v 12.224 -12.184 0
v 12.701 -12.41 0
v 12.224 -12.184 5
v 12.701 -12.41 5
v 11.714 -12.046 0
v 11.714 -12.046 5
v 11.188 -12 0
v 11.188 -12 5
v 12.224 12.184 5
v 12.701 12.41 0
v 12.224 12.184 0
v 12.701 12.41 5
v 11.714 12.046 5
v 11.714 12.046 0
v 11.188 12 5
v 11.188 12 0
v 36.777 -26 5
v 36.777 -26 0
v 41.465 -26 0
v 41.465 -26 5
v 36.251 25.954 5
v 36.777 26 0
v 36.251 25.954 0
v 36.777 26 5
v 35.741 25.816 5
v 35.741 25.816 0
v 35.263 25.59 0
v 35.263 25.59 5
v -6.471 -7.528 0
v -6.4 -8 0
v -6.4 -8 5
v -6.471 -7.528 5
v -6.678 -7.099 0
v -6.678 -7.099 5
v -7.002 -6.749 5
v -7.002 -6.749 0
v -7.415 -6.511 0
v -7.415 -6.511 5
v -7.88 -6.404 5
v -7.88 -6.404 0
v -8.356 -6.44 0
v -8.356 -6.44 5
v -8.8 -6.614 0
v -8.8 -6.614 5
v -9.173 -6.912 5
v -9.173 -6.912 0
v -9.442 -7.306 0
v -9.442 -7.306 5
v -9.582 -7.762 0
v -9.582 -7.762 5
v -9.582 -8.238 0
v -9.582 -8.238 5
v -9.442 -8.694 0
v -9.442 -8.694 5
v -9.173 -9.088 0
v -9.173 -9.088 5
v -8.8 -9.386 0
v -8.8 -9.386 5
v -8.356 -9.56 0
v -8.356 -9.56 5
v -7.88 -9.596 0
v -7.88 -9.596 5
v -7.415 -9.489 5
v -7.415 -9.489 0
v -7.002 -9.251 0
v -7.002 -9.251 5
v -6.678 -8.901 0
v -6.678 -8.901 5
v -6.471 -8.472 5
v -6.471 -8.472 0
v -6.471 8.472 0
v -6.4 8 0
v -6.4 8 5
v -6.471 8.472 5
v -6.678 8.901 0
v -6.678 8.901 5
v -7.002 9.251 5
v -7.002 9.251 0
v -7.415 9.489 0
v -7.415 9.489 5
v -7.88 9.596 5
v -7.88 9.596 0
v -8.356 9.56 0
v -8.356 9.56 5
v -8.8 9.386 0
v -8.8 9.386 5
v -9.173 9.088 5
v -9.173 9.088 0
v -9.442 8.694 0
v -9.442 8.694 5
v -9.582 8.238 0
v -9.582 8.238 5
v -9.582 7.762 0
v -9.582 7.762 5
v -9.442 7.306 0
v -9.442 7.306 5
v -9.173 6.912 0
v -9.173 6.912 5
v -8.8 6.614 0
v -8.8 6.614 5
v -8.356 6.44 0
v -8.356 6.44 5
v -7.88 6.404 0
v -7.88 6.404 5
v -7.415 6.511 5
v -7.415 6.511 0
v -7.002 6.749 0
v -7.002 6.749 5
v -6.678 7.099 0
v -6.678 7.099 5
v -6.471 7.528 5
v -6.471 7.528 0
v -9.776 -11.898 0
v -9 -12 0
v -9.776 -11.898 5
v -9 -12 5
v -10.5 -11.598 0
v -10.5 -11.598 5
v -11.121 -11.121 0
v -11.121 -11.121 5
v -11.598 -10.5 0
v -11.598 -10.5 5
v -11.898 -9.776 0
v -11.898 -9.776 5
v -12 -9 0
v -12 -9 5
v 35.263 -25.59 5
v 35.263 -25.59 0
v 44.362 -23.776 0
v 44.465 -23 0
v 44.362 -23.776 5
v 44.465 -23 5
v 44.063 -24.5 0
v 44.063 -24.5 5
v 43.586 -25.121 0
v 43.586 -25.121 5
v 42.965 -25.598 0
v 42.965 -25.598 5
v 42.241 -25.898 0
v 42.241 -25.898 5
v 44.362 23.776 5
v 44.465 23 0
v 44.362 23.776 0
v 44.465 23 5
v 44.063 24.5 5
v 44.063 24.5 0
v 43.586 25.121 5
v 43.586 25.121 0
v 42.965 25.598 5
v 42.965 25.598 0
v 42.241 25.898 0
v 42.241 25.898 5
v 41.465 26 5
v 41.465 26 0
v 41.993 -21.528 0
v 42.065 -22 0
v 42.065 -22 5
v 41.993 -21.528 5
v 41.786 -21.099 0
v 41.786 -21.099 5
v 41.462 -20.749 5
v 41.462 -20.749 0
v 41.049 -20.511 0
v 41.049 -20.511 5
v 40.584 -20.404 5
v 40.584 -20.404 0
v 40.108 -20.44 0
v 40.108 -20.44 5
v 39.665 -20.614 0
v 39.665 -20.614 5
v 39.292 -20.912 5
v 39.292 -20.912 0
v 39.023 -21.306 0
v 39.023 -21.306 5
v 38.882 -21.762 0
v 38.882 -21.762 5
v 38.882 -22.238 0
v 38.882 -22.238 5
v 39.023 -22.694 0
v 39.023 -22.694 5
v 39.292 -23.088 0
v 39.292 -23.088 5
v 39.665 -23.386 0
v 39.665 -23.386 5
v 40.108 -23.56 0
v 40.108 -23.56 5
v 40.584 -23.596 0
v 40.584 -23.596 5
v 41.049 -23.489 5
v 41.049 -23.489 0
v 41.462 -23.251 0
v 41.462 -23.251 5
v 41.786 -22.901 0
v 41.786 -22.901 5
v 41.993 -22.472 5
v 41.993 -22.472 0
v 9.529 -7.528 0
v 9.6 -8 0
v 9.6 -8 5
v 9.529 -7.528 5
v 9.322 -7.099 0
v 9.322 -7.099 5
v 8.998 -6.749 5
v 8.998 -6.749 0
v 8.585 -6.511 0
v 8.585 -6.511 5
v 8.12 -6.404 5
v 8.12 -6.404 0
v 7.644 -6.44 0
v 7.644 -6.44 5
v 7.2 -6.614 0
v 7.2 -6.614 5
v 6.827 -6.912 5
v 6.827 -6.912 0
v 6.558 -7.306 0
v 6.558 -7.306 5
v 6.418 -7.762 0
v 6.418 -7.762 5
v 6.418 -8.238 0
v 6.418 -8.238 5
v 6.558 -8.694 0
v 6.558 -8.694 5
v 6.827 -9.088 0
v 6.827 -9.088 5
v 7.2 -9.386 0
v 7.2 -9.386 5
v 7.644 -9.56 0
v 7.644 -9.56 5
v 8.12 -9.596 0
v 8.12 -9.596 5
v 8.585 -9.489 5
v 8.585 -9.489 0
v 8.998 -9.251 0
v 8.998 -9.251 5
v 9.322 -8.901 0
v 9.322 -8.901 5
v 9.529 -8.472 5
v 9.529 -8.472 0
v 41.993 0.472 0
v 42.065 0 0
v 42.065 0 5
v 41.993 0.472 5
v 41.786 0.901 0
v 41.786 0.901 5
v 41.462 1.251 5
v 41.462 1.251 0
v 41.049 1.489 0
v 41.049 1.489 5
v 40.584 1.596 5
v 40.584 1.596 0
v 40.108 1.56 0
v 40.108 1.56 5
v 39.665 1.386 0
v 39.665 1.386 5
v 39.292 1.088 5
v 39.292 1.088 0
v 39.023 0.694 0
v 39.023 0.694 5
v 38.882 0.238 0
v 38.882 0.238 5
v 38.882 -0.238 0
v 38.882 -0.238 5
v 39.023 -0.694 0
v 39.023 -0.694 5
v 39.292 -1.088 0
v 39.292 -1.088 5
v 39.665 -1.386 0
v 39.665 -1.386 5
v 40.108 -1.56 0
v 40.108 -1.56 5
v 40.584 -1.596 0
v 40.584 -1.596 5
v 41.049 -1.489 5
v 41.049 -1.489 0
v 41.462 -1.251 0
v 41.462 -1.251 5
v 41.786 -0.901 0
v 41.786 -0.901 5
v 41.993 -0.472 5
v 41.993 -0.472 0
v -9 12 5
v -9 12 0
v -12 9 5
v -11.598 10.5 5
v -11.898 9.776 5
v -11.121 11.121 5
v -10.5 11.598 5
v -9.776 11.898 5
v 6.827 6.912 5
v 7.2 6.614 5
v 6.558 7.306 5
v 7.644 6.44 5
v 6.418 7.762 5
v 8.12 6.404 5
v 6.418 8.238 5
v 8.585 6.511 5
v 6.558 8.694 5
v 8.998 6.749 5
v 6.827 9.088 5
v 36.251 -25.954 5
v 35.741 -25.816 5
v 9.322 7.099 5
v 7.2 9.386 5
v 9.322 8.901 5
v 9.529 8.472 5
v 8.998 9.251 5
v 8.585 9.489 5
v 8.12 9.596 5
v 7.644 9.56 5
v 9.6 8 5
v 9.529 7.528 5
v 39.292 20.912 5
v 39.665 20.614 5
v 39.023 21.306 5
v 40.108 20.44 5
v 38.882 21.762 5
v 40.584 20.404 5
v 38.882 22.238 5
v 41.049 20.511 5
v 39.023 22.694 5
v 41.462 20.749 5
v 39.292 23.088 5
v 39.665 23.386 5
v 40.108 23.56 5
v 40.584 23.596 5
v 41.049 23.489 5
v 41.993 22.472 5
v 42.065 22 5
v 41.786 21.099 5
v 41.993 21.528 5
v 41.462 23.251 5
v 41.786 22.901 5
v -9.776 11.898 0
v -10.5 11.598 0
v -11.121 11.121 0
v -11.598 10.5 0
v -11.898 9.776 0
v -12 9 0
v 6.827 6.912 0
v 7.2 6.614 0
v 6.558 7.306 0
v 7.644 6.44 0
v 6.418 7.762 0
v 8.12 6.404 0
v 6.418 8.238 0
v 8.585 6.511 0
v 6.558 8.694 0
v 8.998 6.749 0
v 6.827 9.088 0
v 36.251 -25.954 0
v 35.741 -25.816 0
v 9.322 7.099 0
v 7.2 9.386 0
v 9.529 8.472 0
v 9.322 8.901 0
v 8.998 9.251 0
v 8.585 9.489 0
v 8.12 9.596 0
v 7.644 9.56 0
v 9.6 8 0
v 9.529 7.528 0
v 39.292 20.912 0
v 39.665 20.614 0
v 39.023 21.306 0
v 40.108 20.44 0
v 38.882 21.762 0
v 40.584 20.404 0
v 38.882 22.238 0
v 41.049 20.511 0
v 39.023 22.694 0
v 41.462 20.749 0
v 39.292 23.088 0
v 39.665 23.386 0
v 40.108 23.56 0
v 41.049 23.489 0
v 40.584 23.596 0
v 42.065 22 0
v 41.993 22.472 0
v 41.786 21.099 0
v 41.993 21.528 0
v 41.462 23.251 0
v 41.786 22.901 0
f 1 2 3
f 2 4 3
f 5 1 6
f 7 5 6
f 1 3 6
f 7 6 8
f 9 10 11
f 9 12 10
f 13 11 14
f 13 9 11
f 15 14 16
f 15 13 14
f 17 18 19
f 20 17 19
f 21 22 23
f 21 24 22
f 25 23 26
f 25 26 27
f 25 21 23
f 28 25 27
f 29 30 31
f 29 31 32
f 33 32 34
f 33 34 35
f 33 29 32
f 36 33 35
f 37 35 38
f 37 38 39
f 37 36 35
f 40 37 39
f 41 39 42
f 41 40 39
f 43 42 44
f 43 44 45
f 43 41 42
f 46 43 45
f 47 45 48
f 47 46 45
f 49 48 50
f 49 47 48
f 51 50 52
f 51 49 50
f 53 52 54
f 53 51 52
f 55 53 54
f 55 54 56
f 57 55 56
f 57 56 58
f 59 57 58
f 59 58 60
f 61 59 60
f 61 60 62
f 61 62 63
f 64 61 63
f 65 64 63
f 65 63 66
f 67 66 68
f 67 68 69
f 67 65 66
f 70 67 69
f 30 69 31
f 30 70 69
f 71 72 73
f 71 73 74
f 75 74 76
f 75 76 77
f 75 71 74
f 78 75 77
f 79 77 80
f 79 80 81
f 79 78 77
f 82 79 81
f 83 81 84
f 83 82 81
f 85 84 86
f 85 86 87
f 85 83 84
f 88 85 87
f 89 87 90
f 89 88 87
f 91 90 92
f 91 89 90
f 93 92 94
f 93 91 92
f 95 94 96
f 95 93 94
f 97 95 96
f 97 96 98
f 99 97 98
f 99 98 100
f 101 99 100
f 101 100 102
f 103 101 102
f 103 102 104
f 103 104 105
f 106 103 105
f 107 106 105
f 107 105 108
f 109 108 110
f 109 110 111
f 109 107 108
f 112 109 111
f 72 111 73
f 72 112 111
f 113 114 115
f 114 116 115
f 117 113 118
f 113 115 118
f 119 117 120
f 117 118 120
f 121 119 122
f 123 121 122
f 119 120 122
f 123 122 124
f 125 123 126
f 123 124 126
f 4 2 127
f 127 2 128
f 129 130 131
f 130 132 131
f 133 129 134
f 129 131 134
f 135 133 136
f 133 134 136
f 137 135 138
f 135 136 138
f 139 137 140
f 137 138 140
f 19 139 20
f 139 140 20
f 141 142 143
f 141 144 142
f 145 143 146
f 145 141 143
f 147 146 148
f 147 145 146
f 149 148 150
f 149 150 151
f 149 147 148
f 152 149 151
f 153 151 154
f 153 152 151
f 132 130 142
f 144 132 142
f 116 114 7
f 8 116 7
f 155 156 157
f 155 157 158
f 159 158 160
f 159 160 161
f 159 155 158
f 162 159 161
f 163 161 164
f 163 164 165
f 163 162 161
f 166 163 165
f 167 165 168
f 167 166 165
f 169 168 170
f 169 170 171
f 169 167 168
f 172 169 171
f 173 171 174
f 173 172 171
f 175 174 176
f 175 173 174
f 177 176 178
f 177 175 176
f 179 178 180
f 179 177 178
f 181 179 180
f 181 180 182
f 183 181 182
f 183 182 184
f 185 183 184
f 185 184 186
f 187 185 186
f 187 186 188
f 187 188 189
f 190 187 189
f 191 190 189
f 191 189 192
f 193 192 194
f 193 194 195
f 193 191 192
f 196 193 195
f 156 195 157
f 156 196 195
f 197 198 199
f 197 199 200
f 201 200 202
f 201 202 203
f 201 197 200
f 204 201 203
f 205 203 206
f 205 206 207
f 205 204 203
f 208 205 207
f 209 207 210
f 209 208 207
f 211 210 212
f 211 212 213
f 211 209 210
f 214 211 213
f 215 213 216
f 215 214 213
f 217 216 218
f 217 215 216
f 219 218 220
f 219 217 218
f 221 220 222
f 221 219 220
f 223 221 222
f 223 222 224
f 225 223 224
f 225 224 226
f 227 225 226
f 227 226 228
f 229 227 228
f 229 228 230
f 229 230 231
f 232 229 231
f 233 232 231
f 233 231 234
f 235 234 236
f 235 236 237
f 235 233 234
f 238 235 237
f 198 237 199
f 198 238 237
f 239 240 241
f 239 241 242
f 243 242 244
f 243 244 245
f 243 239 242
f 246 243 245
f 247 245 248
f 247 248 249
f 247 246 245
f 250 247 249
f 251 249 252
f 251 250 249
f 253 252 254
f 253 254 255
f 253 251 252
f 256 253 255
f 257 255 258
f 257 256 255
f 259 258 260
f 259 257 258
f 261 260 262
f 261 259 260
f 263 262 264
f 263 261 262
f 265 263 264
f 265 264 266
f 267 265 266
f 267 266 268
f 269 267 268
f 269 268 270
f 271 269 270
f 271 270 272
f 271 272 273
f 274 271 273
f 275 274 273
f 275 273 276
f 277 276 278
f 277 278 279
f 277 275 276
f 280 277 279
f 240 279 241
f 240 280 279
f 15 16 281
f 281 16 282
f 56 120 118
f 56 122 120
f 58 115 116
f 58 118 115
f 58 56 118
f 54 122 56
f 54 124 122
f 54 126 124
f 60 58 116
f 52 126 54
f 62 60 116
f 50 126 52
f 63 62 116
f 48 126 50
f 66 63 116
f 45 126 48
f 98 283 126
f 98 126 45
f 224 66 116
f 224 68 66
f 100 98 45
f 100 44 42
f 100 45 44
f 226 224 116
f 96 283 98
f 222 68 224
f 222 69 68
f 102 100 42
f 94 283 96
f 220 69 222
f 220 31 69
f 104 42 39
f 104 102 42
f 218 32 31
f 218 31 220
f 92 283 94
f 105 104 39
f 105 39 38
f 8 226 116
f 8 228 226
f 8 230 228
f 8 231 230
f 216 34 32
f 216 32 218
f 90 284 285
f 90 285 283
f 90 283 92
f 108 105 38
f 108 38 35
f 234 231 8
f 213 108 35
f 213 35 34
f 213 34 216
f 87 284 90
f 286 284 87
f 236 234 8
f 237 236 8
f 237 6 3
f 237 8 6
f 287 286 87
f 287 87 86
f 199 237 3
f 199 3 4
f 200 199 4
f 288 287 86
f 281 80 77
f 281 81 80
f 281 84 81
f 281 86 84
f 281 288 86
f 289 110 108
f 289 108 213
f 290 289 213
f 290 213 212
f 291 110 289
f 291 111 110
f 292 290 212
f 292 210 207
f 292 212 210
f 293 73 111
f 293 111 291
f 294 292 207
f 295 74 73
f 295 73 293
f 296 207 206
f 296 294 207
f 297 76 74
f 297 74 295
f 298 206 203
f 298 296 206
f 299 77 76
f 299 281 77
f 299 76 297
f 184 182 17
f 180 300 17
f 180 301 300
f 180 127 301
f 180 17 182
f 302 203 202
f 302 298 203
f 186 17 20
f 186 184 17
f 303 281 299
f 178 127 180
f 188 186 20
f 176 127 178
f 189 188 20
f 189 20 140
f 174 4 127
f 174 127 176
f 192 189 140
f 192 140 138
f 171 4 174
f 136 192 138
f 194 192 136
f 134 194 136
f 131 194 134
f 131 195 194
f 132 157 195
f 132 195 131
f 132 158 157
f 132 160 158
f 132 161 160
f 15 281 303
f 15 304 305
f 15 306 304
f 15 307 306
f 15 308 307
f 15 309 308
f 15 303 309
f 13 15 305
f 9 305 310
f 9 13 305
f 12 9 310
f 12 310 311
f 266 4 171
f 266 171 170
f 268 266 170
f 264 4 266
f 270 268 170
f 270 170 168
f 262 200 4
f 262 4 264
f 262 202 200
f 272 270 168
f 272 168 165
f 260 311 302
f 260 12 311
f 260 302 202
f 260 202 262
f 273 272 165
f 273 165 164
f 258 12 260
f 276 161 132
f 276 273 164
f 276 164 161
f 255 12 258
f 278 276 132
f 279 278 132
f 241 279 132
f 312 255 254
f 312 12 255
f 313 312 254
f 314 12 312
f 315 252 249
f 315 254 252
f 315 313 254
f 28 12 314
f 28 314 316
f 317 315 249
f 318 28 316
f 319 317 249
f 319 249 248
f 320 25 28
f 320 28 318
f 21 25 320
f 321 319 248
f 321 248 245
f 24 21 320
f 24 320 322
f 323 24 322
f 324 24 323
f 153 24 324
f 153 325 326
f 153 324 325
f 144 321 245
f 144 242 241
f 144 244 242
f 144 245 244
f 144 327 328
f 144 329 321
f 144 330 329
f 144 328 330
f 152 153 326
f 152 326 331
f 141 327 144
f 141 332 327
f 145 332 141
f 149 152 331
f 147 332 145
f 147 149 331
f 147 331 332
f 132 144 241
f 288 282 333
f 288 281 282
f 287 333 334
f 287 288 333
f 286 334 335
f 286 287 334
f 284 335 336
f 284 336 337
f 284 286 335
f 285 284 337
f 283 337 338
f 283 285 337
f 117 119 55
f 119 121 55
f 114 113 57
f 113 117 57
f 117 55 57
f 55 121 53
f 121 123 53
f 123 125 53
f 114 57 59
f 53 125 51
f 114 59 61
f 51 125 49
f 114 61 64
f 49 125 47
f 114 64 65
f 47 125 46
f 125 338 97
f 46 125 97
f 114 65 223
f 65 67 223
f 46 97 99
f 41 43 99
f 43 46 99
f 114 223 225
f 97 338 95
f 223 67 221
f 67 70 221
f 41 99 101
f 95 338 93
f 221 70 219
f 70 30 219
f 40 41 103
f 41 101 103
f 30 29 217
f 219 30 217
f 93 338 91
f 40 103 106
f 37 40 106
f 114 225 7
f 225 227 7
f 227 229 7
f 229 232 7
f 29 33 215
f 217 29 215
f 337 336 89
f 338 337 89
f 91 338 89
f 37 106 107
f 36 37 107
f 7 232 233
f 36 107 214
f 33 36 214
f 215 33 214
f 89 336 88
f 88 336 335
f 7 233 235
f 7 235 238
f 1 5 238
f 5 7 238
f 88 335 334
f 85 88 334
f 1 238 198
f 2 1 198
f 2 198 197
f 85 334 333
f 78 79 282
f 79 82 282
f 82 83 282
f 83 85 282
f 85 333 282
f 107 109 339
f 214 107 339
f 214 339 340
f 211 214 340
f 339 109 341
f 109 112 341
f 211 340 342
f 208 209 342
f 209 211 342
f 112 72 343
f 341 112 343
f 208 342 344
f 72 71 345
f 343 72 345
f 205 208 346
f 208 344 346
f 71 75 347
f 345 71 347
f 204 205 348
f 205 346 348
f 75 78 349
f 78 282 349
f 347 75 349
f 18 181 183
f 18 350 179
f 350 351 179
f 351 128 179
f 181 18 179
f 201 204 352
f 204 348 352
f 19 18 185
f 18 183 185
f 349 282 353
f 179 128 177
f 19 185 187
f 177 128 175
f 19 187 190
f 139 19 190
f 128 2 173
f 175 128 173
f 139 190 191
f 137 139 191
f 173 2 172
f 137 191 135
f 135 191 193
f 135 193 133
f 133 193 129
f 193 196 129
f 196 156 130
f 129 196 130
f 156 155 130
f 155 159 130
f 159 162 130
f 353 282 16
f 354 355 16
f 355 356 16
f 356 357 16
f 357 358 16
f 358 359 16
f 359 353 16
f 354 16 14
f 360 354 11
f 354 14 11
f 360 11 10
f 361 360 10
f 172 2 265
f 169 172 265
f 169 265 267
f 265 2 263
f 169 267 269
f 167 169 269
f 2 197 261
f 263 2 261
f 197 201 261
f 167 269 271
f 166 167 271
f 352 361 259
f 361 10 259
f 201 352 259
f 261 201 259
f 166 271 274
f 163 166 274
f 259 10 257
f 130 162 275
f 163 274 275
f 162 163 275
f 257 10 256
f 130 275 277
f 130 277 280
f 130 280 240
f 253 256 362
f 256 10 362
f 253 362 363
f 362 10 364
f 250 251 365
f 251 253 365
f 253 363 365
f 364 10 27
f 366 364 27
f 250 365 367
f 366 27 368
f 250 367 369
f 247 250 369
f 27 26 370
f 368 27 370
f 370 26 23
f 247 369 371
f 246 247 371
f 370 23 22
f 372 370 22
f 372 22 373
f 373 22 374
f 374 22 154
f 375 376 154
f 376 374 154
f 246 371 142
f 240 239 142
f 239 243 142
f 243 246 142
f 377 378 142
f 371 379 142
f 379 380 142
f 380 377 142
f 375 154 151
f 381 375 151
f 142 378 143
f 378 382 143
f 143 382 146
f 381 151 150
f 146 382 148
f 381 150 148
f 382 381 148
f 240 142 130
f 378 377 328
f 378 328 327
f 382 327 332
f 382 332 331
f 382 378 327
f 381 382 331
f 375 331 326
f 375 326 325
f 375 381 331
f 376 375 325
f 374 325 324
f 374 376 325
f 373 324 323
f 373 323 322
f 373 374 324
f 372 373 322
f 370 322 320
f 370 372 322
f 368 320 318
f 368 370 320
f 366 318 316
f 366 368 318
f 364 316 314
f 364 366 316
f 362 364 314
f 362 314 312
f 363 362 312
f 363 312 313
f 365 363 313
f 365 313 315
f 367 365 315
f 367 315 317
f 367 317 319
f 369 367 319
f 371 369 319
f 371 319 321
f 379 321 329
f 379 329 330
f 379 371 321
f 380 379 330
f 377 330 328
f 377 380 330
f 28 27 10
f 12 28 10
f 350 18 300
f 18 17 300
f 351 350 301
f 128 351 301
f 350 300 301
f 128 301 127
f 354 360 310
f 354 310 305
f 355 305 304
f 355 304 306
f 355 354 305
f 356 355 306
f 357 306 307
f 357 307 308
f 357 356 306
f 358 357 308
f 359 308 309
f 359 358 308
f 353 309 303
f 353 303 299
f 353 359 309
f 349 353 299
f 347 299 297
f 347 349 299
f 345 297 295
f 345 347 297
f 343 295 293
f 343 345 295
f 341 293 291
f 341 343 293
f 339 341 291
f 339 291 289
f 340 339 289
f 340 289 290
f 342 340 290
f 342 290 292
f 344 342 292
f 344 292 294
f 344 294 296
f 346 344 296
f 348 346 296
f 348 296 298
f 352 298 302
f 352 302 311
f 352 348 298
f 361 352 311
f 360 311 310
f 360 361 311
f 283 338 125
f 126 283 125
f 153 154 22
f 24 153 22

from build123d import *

# Parameters (mm, degrees)
SKETCH_1_R      = 1.6
EXTRUDE_1_DEPTH = 5
FILLET_1_R      = 3


with BuildPart() as part:
    # 草图1 → 凸台-拉伸1 (new body)
    with BuildSketch(Plane.XY):
        Polygon((44.464500341, -26), (44.464500341, 26), (35.964500341, 26), (12, 12), (-12, 12), (-12, -12), (12, -12), (35.964500341, -26), align=None)
        with Locations((40.464500341, -22)):
            Circle(SKETCH_1_R, mode=Mode.SUBTRACT)
        with Locations((40.464500341, 0)):
            Circle(SKETCH_1_R, mode=Mode.SUBTRACT)
        with Locations((40.464500341, 22)):
            Circle(SKETCH_1_R, mode=Mode.SUBTRACT)
        with Locations((-8, -8)):
            Circle(SKETCH_1_R, mode=Mode.SUBTRACT)
        with Locations((-8, 8)):
            Circle(SKETCH_1_R, mode=Mode.SUBTRACT)
        with Locations((8, 8)):
            Circle(SKETCH_1_R, mode=Mode.SUBTRACT)
        with Locations((8, -8)):
            Circle(SKETCH_1_R, mode=Mode.SUBTRACT)
    extrude(amount=EXTRUDE_1_DEPTH)

    # 圆角1
    fillet_1_edges = [part.edges().sort_by_distance(p)[0] for p in [
        (-12, -12, 2.5),
        (-12, 12, 2.5),
        (12, 12, 2.5),
        (35.964500341, 26, 2.5),
        (44.464500341, 26, 2.5),
        (44.464500341, -26, 2.5),
        (35.964500341, -26, 2.5),
        (12, -12, 2.5),
    ]]
    fillet(fillet_1_edges, radius=FILLET_1_R)


solid = part.part
